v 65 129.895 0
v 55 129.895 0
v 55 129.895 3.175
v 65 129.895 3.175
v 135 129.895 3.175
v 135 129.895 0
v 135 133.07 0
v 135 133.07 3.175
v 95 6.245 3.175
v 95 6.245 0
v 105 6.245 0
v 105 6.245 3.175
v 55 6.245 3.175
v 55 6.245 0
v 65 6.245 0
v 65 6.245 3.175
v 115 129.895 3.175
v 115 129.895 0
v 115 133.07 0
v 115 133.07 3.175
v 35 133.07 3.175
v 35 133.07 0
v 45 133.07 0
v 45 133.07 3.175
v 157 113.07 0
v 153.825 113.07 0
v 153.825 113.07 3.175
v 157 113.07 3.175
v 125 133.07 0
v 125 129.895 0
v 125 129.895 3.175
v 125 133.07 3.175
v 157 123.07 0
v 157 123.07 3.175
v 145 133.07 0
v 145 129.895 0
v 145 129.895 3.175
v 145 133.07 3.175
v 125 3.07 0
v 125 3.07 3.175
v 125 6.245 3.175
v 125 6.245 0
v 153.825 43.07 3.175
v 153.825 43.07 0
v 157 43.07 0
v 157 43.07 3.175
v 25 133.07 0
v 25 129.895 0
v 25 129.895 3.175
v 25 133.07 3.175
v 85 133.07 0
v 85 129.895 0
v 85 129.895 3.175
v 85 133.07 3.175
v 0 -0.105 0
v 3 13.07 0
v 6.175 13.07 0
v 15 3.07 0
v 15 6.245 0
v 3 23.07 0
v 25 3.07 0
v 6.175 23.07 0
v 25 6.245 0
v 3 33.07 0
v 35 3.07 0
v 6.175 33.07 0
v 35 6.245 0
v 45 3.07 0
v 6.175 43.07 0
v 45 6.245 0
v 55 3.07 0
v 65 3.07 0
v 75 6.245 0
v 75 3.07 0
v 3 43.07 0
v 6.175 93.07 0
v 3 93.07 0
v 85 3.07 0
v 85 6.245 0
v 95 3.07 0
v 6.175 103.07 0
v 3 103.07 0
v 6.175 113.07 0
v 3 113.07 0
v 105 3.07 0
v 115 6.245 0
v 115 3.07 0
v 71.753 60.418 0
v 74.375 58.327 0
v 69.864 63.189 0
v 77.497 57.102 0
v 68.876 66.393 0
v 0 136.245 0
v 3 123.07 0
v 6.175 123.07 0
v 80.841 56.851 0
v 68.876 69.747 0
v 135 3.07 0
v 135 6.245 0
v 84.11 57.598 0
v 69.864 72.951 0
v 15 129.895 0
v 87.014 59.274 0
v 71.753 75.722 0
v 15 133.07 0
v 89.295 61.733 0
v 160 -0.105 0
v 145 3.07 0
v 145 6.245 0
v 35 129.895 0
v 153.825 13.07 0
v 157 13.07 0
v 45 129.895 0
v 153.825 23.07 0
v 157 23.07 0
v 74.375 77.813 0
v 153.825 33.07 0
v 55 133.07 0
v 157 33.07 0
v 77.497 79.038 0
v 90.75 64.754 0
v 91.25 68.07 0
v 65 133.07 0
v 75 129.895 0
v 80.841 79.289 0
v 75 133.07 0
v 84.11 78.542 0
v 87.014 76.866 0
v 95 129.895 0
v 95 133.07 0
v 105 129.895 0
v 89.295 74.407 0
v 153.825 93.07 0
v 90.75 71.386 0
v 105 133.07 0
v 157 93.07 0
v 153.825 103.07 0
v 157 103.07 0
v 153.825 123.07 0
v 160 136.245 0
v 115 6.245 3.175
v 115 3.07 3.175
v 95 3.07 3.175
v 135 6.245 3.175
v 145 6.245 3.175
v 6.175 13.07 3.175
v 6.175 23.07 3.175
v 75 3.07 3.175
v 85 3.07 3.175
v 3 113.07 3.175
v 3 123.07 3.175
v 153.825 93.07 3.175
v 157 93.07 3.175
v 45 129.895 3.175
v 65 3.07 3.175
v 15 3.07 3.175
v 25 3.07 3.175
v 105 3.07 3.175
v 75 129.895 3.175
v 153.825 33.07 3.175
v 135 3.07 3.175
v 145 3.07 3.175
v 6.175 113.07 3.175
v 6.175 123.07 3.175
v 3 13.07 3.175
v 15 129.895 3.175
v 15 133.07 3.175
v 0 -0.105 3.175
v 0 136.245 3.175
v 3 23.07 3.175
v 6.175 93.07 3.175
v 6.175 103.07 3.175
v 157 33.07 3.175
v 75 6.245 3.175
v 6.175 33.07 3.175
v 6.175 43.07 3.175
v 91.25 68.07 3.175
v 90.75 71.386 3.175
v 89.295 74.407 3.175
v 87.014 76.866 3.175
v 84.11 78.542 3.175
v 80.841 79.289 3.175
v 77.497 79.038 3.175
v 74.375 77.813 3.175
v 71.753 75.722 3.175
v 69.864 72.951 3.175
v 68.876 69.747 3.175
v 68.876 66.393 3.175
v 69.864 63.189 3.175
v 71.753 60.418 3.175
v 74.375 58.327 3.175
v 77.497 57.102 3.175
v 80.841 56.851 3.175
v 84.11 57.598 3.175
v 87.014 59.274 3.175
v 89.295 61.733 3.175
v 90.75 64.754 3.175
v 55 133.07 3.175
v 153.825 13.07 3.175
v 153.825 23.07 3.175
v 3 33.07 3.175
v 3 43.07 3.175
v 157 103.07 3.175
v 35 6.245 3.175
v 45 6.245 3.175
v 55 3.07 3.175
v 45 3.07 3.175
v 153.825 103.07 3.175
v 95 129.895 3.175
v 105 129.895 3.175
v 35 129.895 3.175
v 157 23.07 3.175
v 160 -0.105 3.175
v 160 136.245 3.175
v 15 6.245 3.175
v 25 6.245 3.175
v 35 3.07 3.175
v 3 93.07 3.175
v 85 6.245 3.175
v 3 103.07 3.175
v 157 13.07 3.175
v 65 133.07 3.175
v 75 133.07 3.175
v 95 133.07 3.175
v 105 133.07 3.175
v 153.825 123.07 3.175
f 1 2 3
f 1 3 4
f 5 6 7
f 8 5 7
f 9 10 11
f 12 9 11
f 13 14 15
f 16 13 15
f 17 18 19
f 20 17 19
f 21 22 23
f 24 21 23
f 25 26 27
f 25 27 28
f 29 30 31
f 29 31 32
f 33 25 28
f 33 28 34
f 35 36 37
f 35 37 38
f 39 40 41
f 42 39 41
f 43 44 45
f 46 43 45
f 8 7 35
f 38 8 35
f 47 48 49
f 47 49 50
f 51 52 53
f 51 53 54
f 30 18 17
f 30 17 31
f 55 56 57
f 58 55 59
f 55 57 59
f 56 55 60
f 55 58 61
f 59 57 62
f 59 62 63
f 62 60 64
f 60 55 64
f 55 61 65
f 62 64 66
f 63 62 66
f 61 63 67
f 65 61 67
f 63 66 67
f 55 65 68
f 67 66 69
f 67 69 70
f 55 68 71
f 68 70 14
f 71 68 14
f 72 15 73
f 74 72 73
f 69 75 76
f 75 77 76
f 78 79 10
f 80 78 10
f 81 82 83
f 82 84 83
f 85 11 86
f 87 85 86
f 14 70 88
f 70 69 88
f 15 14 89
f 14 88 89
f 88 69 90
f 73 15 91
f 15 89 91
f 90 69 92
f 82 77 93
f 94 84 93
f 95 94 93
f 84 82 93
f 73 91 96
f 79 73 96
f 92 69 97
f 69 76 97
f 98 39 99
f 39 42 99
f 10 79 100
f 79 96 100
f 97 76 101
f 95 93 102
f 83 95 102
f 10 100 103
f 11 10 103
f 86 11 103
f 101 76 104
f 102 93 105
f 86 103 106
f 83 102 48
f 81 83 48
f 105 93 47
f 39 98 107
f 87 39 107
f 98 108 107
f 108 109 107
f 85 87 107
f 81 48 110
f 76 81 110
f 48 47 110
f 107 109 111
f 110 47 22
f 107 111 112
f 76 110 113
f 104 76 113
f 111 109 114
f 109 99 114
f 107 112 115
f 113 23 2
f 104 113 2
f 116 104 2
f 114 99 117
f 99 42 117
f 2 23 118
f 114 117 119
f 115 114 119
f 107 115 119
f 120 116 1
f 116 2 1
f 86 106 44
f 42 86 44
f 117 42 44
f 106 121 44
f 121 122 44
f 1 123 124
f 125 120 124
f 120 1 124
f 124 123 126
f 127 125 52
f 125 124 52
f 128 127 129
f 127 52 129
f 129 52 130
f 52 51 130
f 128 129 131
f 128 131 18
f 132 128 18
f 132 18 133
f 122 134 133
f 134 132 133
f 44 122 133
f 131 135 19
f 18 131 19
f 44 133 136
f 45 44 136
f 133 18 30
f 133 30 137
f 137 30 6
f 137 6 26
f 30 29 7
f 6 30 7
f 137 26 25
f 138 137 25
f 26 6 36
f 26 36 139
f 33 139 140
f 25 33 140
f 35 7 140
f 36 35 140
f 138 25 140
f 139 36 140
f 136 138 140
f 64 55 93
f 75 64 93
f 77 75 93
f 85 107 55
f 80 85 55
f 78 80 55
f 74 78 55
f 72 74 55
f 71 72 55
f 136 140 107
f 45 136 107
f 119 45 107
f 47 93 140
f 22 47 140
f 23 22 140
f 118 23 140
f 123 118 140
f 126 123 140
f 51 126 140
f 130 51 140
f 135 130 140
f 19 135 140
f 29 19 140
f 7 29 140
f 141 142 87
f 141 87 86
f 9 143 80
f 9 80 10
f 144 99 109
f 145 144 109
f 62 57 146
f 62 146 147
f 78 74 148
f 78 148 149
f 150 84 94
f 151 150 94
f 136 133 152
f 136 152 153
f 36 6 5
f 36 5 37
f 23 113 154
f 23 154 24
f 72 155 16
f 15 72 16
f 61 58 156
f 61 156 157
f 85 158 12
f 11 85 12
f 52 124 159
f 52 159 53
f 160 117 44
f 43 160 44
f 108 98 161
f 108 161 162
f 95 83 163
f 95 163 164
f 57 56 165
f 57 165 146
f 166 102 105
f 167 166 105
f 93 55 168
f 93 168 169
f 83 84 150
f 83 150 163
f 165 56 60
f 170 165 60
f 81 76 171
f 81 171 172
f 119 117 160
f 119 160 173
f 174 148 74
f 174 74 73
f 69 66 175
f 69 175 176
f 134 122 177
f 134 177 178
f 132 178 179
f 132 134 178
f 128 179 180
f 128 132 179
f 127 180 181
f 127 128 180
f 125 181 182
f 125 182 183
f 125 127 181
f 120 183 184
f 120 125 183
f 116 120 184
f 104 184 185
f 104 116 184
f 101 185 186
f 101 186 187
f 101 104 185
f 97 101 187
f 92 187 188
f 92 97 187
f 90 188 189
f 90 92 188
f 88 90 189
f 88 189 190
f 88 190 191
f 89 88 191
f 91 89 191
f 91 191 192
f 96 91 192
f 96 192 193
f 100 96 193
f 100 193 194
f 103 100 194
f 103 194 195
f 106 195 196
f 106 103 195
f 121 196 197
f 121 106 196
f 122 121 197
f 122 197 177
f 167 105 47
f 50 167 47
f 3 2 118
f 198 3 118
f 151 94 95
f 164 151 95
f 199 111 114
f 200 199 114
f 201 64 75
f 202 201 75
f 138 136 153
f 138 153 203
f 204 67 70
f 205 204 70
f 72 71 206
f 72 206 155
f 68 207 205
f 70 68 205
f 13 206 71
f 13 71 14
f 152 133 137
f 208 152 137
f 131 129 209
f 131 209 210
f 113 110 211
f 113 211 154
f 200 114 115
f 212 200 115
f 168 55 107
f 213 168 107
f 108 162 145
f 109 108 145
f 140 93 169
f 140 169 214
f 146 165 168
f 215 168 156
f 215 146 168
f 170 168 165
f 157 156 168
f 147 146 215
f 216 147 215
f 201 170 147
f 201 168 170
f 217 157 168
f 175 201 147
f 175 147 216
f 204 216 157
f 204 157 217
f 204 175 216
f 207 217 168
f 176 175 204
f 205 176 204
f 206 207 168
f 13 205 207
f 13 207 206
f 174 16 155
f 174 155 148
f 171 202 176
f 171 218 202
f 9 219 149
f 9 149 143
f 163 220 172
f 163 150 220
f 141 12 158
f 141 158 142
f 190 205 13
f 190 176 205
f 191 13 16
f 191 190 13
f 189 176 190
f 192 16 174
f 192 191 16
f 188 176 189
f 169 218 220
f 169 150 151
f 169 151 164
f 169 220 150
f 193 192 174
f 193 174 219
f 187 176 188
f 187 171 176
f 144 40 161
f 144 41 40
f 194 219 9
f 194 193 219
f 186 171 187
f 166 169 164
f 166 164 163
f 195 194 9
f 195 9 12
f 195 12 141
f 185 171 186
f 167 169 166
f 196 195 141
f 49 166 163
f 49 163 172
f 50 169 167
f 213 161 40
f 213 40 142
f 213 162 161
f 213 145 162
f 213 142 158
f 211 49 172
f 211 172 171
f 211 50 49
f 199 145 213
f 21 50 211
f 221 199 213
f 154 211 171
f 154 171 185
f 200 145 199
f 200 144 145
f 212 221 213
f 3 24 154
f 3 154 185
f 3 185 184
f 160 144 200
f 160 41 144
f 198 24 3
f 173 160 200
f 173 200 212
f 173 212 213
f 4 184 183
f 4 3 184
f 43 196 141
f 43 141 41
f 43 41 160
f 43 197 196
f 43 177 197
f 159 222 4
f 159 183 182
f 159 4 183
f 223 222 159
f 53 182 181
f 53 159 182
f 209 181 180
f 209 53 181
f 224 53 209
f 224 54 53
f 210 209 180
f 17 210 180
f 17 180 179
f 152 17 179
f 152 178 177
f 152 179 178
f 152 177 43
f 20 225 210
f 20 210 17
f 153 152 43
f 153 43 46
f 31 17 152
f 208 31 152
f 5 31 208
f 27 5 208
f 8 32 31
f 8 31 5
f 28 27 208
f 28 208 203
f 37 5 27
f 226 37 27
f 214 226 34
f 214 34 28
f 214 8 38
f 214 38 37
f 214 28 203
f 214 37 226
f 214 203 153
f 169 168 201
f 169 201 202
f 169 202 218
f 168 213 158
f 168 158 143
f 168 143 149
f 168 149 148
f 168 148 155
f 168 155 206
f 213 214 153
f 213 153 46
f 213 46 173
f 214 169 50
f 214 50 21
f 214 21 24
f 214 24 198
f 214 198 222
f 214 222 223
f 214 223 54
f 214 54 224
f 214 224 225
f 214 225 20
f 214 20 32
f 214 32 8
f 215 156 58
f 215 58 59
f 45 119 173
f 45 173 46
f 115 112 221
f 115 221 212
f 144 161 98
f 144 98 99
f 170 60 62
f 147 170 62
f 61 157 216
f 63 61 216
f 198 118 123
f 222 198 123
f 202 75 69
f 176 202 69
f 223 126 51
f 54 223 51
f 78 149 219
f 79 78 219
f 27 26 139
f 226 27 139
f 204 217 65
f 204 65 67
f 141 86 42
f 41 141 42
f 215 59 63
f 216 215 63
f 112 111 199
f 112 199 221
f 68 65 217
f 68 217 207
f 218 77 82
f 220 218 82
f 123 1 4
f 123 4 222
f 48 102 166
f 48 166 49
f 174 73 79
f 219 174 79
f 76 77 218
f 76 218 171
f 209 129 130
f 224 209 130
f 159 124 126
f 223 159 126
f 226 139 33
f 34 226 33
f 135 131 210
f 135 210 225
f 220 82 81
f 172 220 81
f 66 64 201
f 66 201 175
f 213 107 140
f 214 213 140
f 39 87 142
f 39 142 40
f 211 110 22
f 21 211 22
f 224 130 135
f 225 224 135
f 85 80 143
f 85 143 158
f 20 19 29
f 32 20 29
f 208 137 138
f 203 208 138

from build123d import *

# Parameters (mm, degrees)
SKETCH1_W           = 160
SKETCH1_H           = 136.35
SKETCH1_R           = 11.25
SKETCH1_W_2         = 10
SKETCH1_H_2         = 3.175
SKETCH1_W_3         = 3.175
SKETCH1_H_3         = 10
BOSS_EXTRUDE1_DEPTH = 3.175


with BuildPart() as part:
    # Sketch1 → Boss-Extrude1 (new body)
    with BuildSketch(Plane.XY):
        with Locations((80, 68.069958461)):
            Rectangle(SKETCH1_W, SKETCH1_H)
        with Locations((80, 68.069958461)):
            Circle(SKETCH1_R, mode=Mode.SUBTRACT)
        with Locations((40, 131.482458461)):
            Rectangle(SKETCH1_W_2, SKETCH1_H_2, mode=Mode.SUBTRACT)
        with Locations((20, 131.482458461)):
            Rectangle(SKETCH1_W_2, SKETCH1_H_2, mode=Mode.SUBTRACT)
        with Locations((60, 131.482458461)):
            Rectangle(SKETCH1_W_2, SKETCH1_H_2, mode=Mode.SUBTRACT)
        with Locations((80, 131.482458461)):
            Rectangle(SKETCH1_W_2, SKETCH1_H_2, mode=Mode.SUBTRACT)
        with Locations((100, 131.482458461)):
            Rectangle(SKETCH1_W_2, SKETCH1_H_2, mode=Mode.SUBTRACT)
        with Locations((120, 131.482458461)):
            Rectangle(SKETCH1_W_2, SKETCH1_H_2, mode=Mode.SUBTRACT)
        with Locations((140, 131.482458461)):
            Rectangle(SKETCH1_W_2, SKETCH1_H_2, mode=Mode.SUBTRACT)
        with Locations((140, 4.657458461)):
            Rectangle(SKETCH1_W_2, SKETCH1_H_2, mode=Mode.SUBTRACT)
        with Locations((120, 4.657458461)):
            Rectangle(SKETCH1_W_2, SKETCH1_H_2, mode=Mode.SUBTRACT)
        with Locations((100, 4.657458461)):
            Rectangle(SKETCH1_W_2, SKETCH1_H_2, mode=Mode.SUBTRACT)
        with Locations((80, 4.657458461)):
            Rectangle(SKETCH1_W_2, SKETCH1_H_2, mode=Mode.SUBTRACT)
        with Locations((60, 4.657458461)):
            Rectangle(SKETCH1_W_2, SKETCH1_H_2, mode=Mode.SUBTRACT)
        with Locations((40, 4.657458461)):
            Rectangle(SKETCH1_W_2, SKETCH1_H_2, mode=Mode.SUBTRACT)
        with Locations((20, 4.657458461)):
            Rectangle(SKETCH1_W_2, SKETCH1_H_2, mode=Mode.SUBTRACT)
        with Locations((4.5875, 38.069958461)):
            Rectangle(SKETCH1_W_3, SKETCH1_H_3, mode=Mode.SUBTRACT)
        with Locations((4.5875, 98.069958461)):
            Rectangle(SKETCH1_W_3, SKETCH1_H_3, mode=Mode.SUBTRACT)
        with Locations((4.5875, 118.069958461)):
            Rectangle(SKETCH1_W_3, SKETCH1_H_3, mode=Mode.SUBTRACT)
        with Locations((4.5875, 18.069958461)):
            Rectangle(SKETCH1_W_3, SKETCH1_H_3, mode=Mode.SUBTRACT)
        with Locations((155.4125, 18.069958461)):
            Rectangle(SKETCH1_W_3, SKETCH1_H_3, mode=Mode.SUBTRACT)
        with Locations((155.4125, 38.069958461)):
            Rectangle(SKETCH1_W_3, SKETCH1_H_3, mode=Mode.SUBTRACT)
        with Locations((155.4125, 98.069958461)):
            Rectangle(SKETCH1_W_3, SKETCH1_H_3, mode=Mode.SUBTRACT)
        with Locations((155.4125, 118.069958461)):
            Rectangle(SKETCH1_W_3, SKETCH1_H_3, mode=Mode.SUBTRACT)
    extrude(amount=BOSS_EXTRUDE1_DEPTH)


solid = part.part
